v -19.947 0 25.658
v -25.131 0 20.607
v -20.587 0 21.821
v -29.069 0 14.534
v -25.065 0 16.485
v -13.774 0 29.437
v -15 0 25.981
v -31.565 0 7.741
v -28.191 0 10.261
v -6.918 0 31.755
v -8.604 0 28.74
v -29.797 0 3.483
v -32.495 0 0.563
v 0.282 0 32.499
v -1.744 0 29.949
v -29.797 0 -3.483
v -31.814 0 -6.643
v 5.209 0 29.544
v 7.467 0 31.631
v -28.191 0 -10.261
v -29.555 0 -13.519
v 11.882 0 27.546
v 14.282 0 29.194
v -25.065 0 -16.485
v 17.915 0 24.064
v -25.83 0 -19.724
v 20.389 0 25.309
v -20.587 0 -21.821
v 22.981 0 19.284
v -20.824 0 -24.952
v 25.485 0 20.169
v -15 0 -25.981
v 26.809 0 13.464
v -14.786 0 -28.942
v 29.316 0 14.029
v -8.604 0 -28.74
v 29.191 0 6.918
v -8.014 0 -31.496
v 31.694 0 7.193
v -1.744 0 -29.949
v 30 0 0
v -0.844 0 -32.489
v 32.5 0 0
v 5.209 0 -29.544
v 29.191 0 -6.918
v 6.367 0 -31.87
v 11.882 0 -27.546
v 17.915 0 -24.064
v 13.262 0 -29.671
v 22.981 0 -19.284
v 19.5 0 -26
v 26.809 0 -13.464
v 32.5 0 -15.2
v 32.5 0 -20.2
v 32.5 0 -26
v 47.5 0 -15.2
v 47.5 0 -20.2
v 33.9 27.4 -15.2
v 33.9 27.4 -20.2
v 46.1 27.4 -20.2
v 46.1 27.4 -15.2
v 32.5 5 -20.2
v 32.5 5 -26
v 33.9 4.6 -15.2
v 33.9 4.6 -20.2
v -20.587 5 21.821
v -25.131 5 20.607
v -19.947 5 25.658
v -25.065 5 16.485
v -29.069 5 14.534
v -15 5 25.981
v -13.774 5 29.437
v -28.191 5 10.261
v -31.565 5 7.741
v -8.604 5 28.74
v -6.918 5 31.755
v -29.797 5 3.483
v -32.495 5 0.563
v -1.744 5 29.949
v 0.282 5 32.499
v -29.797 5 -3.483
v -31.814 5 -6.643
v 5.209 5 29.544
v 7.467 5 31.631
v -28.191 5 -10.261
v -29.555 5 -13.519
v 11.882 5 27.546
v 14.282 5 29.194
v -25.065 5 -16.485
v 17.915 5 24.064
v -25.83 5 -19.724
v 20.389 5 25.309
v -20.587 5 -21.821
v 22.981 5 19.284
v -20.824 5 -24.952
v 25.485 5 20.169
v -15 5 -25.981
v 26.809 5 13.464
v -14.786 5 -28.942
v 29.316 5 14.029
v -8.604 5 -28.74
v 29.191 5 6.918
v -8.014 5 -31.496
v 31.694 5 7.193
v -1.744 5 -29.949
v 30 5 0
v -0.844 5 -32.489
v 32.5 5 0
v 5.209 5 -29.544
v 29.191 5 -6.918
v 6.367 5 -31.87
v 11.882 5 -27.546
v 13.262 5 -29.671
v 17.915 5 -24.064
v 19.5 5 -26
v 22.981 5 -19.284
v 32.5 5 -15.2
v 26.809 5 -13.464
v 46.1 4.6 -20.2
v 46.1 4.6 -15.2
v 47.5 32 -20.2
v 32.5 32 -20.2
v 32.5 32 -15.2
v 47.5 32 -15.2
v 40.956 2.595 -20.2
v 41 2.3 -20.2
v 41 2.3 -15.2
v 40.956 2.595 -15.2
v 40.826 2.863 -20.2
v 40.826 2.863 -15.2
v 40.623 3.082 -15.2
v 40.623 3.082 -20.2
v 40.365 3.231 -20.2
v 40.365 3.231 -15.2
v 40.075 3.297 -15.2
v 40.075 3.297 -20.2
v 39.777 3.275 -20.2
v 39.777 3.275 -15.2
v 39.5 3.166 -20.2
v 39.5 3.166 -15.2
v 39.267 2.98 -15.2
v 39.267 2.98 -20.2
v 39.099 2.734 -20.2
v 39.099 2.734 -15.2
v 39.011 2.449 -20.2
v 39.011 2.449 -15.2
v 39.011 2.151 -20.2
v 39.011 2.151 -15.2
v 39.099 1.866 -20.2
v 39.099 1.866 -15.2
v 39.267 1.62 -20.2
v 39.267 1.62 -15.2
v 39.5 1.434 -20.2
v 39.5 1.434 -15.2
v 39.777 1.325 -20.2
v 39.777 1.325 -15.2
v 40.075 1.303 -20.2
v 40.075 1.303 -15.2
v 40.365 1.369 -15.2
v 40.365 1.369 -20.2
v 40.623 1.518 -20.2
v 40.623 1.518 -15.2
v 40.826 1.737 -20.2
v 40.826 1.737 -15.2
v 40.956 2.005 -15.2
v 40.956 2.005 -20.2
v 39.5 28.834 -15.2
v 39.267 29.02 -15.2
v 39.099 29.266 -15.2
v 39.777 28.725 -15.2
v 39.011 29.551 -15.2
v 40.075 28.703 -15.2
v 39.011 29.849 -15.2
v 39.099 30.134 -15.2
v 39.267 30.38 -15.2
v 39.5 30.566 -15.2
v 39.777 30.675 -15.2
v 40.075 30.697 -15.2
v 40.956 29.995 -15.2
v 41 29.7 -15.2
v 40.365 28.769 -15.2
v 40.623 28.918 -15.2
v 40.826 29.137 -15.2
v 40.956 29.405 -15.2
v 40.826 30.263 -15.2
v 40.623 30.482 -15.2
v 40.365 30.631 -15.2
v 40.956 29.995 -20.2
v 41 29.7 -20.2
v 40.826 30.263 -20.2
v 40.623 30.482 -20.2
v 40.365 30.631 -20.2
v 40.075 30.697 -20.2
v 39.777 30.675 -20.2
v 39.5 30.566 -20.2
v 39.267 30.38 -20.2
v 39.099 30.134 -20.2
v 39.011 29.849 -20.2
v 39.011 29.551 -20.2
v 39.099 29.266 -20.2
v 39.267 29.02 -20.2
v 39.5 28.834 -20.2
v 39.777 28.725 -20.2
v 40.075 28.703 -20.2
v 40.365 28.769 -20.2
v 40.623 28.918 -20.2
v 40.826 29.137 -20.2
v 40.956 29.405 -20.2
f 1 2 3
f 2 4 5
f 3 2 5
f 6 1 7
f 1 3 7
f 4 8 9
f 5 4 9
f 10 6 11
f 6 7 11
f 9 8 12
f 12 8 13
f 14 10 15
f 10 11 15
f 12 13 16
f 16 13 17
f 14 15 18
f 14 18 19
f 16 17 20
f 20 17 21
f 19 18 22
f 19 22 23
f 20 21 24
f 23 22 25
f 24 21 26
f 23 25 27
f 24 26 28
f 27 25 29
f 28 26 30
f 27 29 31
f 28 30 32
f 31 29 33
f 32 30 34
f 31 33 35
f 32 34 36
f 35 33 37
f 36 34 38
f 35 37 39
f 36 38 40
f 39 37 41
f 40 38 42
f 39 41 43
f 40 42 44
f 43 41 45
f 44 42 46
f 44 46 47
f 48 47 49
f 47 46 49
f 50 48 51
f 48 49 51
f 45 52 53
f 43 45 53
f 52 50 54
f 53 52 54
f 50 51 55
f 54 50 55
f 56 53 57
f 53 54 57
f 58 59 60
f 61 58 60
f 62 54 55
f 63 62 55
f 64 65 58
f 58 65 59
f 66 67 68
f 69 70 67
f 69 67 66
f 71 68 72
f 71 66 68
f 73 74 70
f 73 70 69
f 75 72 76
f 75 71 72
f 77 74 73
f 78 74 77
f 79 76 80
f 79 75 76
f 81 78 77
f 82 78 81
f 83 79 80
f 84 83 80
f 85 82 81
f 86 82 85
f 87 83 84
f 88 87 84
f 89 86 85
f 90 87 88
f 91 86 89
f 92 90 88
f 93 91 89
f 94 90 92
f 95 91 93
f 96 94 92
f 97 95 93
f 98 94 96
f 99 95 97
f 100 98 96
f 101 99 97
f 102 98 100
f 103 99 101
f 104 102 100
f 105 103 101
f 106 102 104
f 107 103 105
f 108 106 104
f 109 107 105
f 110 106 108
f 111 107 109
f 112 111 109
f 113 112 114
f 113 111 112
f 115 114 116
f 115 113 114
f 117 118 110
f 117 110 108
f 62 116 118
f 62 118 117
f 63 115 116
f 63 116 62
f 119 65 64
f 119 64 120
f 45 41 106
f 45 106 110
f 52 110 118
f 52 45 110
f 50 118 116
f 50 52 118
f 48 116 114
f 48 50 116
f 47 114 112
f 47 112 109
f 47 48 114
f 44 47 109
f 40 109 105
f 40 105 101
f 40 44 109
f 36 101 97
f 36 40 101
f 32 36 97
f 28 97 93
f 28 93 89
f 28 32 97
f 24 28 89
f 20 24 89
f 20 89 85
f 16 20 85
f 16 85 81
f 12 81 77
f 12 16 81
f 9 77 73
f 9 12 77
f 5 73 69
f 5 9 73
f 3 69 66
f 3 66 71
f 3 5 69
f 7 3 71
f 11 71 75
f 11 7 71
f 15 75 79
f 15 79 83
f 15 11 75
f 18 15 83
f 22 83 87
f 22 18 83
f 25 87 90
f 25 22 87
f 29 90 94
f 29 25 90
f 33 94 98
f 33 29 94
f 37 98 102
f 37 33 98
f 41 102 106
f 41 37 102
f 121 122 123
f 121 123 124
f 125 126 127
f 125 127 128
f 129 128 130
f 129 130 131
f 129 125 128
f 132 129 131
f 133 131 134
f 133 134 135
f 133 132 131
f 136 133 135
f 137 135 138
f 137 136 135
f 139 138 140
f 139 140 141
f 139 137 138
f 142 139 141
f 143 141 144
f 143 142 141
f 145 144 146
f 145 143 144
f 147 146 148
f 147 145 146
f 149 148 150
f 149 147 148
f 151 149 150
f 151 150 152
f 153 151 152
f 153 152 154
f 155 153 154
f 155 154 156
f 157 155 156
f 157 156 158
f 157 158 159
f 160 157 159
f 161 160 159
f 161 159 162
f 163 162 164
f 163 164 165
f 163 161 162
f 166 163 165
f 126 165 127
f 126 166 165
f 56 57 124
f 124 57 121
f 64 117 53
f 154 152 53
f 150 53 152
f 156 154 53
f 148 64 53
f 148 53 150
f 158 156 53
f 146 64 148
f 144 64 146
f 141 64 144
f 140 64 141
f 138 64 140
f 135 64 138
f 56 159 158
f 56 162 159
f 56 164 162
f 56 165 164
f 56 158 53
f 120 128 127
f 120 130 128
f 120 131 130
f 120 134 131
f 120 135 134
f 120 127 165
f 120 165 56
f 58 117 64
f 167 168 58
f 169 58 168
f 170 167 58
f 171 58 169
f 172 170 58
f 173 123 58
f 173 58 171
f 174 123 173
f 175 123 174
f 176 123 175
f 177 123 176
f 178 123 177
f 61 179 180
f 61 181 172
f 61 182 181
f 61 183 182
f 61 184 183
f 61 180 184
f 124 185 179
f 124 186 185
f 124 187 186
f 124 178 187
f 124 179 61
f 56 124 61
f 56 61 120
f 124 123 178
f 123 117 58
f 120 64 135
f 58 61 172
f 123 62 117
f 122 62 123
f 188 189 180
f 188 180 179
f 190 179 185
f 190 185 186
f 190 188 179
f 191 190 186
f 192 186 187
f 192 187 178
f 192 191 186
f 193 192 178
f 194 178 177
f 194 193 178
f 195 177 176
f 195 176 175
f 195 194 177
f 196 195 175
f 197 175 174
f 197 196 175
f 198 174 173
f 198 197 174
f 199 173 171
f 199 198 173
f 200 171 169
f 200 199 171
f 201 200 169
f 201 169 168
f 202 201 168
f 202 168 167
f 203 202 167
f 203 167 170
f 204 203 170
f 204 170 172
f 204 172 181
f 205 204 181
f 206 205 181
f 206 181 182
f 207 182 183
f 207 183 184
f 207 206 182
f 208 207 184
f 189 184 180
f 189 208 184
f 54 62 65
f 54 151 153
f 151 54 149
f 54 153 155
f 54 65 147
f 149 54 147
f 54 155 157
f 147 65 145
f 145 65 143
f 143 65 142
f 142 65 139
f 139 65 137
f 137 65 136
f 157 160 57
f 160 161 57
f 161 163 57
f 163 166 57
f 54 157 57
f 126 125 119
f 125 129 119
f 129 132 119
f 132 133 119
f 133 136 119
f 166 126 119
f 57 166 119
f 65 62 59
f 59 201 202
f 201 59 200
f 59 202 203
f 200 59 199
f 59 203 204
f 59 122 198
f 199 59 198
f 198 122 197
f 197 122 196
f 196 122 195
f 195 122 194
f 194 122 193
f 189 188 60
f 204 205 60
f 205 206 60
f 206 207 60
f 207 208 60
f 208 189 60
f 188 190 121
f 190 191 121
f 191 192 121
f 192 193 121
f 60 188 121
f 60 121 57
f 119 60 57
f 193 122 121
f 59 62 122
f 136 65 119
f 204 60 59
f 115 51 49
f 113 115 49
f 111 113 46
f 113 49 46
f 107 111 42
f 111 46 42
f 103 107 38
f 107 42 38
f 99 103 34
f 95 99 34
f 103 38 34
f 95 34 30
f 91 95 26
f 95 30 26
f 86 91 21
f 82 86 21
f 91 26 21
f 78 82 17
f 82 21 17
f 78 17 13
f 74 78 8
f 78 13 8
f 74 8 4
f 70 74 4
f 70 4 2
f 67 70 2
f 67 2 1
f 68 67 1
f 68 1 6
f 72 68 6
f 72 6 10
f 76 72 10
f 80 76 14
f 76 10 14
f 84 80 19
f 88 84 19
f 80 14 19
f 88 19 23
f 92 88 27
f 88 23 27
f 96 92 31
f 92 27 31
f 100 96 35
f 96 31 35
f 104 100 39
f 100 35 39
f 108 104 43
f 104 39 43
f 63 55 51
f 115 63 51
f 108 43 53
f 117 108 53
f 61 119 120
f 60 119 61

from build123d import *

# Parameters (mm, degrees)
SKETCH1_R           = 30
BOSS_EXTRUDE1_DEPTH = 5
BOSS_EXTRUDE4_START = -20.2
SKETCH3_W           = 15
SKETCH3_H           = 32
SKETCH3_R           = 1
SKETCH3_W_2         = 12.2
SKETCH3_H_2         = 22.8
BOSS_EXTRUDE4_DEPTH = 5


with BuildPart() as part:
    # Sketch1 → Boss-Extrude1 (new body)
    with BuildSketch(Plane(origin=(0, 0, 0), x_dir=(1, 0, 0), z_dir=(0, 1, 0))):
        with BuildLine():
            Line((32.5, 0), (32.5, 26))
            Line((32.5, 26), (19.5, 26))
            ThreePointArc((19.5, 26), (-29.068883707, -14.534441854), (32.5, 0))
        make_face()
        Circle(SKETCH1_R, mode=Mode.SUBTRACT)
    extrude(amount=BOSS_EXTRUDE1_DEPTH)

    # Sketch3 → Boss-Extrude4 (add)
    with BuildSketch(Plane.XY.offset(BOSS_EXTRUDE4_START)):
        with Locations((40, 16)):
            Rectangle(SKETCH3_W, SKETCH3_H)
        with Locations((40, 29.7)):
            Circle(SKETCH3_R, mode=Mode.SUBTRACT)
        with Locations((40, 2.3)):
            Circle(SKETCH3_R, mode=Mode.SUBTRACT)
        with Locations((40, 16)):
            Rectangle(SKETCH3_W_2, SKETCH3_H_2, mode=Mode.SUBTRACT)
    extrude(amount=BOSS_EXTRUDE4_DEPTH)


solid = part.part
